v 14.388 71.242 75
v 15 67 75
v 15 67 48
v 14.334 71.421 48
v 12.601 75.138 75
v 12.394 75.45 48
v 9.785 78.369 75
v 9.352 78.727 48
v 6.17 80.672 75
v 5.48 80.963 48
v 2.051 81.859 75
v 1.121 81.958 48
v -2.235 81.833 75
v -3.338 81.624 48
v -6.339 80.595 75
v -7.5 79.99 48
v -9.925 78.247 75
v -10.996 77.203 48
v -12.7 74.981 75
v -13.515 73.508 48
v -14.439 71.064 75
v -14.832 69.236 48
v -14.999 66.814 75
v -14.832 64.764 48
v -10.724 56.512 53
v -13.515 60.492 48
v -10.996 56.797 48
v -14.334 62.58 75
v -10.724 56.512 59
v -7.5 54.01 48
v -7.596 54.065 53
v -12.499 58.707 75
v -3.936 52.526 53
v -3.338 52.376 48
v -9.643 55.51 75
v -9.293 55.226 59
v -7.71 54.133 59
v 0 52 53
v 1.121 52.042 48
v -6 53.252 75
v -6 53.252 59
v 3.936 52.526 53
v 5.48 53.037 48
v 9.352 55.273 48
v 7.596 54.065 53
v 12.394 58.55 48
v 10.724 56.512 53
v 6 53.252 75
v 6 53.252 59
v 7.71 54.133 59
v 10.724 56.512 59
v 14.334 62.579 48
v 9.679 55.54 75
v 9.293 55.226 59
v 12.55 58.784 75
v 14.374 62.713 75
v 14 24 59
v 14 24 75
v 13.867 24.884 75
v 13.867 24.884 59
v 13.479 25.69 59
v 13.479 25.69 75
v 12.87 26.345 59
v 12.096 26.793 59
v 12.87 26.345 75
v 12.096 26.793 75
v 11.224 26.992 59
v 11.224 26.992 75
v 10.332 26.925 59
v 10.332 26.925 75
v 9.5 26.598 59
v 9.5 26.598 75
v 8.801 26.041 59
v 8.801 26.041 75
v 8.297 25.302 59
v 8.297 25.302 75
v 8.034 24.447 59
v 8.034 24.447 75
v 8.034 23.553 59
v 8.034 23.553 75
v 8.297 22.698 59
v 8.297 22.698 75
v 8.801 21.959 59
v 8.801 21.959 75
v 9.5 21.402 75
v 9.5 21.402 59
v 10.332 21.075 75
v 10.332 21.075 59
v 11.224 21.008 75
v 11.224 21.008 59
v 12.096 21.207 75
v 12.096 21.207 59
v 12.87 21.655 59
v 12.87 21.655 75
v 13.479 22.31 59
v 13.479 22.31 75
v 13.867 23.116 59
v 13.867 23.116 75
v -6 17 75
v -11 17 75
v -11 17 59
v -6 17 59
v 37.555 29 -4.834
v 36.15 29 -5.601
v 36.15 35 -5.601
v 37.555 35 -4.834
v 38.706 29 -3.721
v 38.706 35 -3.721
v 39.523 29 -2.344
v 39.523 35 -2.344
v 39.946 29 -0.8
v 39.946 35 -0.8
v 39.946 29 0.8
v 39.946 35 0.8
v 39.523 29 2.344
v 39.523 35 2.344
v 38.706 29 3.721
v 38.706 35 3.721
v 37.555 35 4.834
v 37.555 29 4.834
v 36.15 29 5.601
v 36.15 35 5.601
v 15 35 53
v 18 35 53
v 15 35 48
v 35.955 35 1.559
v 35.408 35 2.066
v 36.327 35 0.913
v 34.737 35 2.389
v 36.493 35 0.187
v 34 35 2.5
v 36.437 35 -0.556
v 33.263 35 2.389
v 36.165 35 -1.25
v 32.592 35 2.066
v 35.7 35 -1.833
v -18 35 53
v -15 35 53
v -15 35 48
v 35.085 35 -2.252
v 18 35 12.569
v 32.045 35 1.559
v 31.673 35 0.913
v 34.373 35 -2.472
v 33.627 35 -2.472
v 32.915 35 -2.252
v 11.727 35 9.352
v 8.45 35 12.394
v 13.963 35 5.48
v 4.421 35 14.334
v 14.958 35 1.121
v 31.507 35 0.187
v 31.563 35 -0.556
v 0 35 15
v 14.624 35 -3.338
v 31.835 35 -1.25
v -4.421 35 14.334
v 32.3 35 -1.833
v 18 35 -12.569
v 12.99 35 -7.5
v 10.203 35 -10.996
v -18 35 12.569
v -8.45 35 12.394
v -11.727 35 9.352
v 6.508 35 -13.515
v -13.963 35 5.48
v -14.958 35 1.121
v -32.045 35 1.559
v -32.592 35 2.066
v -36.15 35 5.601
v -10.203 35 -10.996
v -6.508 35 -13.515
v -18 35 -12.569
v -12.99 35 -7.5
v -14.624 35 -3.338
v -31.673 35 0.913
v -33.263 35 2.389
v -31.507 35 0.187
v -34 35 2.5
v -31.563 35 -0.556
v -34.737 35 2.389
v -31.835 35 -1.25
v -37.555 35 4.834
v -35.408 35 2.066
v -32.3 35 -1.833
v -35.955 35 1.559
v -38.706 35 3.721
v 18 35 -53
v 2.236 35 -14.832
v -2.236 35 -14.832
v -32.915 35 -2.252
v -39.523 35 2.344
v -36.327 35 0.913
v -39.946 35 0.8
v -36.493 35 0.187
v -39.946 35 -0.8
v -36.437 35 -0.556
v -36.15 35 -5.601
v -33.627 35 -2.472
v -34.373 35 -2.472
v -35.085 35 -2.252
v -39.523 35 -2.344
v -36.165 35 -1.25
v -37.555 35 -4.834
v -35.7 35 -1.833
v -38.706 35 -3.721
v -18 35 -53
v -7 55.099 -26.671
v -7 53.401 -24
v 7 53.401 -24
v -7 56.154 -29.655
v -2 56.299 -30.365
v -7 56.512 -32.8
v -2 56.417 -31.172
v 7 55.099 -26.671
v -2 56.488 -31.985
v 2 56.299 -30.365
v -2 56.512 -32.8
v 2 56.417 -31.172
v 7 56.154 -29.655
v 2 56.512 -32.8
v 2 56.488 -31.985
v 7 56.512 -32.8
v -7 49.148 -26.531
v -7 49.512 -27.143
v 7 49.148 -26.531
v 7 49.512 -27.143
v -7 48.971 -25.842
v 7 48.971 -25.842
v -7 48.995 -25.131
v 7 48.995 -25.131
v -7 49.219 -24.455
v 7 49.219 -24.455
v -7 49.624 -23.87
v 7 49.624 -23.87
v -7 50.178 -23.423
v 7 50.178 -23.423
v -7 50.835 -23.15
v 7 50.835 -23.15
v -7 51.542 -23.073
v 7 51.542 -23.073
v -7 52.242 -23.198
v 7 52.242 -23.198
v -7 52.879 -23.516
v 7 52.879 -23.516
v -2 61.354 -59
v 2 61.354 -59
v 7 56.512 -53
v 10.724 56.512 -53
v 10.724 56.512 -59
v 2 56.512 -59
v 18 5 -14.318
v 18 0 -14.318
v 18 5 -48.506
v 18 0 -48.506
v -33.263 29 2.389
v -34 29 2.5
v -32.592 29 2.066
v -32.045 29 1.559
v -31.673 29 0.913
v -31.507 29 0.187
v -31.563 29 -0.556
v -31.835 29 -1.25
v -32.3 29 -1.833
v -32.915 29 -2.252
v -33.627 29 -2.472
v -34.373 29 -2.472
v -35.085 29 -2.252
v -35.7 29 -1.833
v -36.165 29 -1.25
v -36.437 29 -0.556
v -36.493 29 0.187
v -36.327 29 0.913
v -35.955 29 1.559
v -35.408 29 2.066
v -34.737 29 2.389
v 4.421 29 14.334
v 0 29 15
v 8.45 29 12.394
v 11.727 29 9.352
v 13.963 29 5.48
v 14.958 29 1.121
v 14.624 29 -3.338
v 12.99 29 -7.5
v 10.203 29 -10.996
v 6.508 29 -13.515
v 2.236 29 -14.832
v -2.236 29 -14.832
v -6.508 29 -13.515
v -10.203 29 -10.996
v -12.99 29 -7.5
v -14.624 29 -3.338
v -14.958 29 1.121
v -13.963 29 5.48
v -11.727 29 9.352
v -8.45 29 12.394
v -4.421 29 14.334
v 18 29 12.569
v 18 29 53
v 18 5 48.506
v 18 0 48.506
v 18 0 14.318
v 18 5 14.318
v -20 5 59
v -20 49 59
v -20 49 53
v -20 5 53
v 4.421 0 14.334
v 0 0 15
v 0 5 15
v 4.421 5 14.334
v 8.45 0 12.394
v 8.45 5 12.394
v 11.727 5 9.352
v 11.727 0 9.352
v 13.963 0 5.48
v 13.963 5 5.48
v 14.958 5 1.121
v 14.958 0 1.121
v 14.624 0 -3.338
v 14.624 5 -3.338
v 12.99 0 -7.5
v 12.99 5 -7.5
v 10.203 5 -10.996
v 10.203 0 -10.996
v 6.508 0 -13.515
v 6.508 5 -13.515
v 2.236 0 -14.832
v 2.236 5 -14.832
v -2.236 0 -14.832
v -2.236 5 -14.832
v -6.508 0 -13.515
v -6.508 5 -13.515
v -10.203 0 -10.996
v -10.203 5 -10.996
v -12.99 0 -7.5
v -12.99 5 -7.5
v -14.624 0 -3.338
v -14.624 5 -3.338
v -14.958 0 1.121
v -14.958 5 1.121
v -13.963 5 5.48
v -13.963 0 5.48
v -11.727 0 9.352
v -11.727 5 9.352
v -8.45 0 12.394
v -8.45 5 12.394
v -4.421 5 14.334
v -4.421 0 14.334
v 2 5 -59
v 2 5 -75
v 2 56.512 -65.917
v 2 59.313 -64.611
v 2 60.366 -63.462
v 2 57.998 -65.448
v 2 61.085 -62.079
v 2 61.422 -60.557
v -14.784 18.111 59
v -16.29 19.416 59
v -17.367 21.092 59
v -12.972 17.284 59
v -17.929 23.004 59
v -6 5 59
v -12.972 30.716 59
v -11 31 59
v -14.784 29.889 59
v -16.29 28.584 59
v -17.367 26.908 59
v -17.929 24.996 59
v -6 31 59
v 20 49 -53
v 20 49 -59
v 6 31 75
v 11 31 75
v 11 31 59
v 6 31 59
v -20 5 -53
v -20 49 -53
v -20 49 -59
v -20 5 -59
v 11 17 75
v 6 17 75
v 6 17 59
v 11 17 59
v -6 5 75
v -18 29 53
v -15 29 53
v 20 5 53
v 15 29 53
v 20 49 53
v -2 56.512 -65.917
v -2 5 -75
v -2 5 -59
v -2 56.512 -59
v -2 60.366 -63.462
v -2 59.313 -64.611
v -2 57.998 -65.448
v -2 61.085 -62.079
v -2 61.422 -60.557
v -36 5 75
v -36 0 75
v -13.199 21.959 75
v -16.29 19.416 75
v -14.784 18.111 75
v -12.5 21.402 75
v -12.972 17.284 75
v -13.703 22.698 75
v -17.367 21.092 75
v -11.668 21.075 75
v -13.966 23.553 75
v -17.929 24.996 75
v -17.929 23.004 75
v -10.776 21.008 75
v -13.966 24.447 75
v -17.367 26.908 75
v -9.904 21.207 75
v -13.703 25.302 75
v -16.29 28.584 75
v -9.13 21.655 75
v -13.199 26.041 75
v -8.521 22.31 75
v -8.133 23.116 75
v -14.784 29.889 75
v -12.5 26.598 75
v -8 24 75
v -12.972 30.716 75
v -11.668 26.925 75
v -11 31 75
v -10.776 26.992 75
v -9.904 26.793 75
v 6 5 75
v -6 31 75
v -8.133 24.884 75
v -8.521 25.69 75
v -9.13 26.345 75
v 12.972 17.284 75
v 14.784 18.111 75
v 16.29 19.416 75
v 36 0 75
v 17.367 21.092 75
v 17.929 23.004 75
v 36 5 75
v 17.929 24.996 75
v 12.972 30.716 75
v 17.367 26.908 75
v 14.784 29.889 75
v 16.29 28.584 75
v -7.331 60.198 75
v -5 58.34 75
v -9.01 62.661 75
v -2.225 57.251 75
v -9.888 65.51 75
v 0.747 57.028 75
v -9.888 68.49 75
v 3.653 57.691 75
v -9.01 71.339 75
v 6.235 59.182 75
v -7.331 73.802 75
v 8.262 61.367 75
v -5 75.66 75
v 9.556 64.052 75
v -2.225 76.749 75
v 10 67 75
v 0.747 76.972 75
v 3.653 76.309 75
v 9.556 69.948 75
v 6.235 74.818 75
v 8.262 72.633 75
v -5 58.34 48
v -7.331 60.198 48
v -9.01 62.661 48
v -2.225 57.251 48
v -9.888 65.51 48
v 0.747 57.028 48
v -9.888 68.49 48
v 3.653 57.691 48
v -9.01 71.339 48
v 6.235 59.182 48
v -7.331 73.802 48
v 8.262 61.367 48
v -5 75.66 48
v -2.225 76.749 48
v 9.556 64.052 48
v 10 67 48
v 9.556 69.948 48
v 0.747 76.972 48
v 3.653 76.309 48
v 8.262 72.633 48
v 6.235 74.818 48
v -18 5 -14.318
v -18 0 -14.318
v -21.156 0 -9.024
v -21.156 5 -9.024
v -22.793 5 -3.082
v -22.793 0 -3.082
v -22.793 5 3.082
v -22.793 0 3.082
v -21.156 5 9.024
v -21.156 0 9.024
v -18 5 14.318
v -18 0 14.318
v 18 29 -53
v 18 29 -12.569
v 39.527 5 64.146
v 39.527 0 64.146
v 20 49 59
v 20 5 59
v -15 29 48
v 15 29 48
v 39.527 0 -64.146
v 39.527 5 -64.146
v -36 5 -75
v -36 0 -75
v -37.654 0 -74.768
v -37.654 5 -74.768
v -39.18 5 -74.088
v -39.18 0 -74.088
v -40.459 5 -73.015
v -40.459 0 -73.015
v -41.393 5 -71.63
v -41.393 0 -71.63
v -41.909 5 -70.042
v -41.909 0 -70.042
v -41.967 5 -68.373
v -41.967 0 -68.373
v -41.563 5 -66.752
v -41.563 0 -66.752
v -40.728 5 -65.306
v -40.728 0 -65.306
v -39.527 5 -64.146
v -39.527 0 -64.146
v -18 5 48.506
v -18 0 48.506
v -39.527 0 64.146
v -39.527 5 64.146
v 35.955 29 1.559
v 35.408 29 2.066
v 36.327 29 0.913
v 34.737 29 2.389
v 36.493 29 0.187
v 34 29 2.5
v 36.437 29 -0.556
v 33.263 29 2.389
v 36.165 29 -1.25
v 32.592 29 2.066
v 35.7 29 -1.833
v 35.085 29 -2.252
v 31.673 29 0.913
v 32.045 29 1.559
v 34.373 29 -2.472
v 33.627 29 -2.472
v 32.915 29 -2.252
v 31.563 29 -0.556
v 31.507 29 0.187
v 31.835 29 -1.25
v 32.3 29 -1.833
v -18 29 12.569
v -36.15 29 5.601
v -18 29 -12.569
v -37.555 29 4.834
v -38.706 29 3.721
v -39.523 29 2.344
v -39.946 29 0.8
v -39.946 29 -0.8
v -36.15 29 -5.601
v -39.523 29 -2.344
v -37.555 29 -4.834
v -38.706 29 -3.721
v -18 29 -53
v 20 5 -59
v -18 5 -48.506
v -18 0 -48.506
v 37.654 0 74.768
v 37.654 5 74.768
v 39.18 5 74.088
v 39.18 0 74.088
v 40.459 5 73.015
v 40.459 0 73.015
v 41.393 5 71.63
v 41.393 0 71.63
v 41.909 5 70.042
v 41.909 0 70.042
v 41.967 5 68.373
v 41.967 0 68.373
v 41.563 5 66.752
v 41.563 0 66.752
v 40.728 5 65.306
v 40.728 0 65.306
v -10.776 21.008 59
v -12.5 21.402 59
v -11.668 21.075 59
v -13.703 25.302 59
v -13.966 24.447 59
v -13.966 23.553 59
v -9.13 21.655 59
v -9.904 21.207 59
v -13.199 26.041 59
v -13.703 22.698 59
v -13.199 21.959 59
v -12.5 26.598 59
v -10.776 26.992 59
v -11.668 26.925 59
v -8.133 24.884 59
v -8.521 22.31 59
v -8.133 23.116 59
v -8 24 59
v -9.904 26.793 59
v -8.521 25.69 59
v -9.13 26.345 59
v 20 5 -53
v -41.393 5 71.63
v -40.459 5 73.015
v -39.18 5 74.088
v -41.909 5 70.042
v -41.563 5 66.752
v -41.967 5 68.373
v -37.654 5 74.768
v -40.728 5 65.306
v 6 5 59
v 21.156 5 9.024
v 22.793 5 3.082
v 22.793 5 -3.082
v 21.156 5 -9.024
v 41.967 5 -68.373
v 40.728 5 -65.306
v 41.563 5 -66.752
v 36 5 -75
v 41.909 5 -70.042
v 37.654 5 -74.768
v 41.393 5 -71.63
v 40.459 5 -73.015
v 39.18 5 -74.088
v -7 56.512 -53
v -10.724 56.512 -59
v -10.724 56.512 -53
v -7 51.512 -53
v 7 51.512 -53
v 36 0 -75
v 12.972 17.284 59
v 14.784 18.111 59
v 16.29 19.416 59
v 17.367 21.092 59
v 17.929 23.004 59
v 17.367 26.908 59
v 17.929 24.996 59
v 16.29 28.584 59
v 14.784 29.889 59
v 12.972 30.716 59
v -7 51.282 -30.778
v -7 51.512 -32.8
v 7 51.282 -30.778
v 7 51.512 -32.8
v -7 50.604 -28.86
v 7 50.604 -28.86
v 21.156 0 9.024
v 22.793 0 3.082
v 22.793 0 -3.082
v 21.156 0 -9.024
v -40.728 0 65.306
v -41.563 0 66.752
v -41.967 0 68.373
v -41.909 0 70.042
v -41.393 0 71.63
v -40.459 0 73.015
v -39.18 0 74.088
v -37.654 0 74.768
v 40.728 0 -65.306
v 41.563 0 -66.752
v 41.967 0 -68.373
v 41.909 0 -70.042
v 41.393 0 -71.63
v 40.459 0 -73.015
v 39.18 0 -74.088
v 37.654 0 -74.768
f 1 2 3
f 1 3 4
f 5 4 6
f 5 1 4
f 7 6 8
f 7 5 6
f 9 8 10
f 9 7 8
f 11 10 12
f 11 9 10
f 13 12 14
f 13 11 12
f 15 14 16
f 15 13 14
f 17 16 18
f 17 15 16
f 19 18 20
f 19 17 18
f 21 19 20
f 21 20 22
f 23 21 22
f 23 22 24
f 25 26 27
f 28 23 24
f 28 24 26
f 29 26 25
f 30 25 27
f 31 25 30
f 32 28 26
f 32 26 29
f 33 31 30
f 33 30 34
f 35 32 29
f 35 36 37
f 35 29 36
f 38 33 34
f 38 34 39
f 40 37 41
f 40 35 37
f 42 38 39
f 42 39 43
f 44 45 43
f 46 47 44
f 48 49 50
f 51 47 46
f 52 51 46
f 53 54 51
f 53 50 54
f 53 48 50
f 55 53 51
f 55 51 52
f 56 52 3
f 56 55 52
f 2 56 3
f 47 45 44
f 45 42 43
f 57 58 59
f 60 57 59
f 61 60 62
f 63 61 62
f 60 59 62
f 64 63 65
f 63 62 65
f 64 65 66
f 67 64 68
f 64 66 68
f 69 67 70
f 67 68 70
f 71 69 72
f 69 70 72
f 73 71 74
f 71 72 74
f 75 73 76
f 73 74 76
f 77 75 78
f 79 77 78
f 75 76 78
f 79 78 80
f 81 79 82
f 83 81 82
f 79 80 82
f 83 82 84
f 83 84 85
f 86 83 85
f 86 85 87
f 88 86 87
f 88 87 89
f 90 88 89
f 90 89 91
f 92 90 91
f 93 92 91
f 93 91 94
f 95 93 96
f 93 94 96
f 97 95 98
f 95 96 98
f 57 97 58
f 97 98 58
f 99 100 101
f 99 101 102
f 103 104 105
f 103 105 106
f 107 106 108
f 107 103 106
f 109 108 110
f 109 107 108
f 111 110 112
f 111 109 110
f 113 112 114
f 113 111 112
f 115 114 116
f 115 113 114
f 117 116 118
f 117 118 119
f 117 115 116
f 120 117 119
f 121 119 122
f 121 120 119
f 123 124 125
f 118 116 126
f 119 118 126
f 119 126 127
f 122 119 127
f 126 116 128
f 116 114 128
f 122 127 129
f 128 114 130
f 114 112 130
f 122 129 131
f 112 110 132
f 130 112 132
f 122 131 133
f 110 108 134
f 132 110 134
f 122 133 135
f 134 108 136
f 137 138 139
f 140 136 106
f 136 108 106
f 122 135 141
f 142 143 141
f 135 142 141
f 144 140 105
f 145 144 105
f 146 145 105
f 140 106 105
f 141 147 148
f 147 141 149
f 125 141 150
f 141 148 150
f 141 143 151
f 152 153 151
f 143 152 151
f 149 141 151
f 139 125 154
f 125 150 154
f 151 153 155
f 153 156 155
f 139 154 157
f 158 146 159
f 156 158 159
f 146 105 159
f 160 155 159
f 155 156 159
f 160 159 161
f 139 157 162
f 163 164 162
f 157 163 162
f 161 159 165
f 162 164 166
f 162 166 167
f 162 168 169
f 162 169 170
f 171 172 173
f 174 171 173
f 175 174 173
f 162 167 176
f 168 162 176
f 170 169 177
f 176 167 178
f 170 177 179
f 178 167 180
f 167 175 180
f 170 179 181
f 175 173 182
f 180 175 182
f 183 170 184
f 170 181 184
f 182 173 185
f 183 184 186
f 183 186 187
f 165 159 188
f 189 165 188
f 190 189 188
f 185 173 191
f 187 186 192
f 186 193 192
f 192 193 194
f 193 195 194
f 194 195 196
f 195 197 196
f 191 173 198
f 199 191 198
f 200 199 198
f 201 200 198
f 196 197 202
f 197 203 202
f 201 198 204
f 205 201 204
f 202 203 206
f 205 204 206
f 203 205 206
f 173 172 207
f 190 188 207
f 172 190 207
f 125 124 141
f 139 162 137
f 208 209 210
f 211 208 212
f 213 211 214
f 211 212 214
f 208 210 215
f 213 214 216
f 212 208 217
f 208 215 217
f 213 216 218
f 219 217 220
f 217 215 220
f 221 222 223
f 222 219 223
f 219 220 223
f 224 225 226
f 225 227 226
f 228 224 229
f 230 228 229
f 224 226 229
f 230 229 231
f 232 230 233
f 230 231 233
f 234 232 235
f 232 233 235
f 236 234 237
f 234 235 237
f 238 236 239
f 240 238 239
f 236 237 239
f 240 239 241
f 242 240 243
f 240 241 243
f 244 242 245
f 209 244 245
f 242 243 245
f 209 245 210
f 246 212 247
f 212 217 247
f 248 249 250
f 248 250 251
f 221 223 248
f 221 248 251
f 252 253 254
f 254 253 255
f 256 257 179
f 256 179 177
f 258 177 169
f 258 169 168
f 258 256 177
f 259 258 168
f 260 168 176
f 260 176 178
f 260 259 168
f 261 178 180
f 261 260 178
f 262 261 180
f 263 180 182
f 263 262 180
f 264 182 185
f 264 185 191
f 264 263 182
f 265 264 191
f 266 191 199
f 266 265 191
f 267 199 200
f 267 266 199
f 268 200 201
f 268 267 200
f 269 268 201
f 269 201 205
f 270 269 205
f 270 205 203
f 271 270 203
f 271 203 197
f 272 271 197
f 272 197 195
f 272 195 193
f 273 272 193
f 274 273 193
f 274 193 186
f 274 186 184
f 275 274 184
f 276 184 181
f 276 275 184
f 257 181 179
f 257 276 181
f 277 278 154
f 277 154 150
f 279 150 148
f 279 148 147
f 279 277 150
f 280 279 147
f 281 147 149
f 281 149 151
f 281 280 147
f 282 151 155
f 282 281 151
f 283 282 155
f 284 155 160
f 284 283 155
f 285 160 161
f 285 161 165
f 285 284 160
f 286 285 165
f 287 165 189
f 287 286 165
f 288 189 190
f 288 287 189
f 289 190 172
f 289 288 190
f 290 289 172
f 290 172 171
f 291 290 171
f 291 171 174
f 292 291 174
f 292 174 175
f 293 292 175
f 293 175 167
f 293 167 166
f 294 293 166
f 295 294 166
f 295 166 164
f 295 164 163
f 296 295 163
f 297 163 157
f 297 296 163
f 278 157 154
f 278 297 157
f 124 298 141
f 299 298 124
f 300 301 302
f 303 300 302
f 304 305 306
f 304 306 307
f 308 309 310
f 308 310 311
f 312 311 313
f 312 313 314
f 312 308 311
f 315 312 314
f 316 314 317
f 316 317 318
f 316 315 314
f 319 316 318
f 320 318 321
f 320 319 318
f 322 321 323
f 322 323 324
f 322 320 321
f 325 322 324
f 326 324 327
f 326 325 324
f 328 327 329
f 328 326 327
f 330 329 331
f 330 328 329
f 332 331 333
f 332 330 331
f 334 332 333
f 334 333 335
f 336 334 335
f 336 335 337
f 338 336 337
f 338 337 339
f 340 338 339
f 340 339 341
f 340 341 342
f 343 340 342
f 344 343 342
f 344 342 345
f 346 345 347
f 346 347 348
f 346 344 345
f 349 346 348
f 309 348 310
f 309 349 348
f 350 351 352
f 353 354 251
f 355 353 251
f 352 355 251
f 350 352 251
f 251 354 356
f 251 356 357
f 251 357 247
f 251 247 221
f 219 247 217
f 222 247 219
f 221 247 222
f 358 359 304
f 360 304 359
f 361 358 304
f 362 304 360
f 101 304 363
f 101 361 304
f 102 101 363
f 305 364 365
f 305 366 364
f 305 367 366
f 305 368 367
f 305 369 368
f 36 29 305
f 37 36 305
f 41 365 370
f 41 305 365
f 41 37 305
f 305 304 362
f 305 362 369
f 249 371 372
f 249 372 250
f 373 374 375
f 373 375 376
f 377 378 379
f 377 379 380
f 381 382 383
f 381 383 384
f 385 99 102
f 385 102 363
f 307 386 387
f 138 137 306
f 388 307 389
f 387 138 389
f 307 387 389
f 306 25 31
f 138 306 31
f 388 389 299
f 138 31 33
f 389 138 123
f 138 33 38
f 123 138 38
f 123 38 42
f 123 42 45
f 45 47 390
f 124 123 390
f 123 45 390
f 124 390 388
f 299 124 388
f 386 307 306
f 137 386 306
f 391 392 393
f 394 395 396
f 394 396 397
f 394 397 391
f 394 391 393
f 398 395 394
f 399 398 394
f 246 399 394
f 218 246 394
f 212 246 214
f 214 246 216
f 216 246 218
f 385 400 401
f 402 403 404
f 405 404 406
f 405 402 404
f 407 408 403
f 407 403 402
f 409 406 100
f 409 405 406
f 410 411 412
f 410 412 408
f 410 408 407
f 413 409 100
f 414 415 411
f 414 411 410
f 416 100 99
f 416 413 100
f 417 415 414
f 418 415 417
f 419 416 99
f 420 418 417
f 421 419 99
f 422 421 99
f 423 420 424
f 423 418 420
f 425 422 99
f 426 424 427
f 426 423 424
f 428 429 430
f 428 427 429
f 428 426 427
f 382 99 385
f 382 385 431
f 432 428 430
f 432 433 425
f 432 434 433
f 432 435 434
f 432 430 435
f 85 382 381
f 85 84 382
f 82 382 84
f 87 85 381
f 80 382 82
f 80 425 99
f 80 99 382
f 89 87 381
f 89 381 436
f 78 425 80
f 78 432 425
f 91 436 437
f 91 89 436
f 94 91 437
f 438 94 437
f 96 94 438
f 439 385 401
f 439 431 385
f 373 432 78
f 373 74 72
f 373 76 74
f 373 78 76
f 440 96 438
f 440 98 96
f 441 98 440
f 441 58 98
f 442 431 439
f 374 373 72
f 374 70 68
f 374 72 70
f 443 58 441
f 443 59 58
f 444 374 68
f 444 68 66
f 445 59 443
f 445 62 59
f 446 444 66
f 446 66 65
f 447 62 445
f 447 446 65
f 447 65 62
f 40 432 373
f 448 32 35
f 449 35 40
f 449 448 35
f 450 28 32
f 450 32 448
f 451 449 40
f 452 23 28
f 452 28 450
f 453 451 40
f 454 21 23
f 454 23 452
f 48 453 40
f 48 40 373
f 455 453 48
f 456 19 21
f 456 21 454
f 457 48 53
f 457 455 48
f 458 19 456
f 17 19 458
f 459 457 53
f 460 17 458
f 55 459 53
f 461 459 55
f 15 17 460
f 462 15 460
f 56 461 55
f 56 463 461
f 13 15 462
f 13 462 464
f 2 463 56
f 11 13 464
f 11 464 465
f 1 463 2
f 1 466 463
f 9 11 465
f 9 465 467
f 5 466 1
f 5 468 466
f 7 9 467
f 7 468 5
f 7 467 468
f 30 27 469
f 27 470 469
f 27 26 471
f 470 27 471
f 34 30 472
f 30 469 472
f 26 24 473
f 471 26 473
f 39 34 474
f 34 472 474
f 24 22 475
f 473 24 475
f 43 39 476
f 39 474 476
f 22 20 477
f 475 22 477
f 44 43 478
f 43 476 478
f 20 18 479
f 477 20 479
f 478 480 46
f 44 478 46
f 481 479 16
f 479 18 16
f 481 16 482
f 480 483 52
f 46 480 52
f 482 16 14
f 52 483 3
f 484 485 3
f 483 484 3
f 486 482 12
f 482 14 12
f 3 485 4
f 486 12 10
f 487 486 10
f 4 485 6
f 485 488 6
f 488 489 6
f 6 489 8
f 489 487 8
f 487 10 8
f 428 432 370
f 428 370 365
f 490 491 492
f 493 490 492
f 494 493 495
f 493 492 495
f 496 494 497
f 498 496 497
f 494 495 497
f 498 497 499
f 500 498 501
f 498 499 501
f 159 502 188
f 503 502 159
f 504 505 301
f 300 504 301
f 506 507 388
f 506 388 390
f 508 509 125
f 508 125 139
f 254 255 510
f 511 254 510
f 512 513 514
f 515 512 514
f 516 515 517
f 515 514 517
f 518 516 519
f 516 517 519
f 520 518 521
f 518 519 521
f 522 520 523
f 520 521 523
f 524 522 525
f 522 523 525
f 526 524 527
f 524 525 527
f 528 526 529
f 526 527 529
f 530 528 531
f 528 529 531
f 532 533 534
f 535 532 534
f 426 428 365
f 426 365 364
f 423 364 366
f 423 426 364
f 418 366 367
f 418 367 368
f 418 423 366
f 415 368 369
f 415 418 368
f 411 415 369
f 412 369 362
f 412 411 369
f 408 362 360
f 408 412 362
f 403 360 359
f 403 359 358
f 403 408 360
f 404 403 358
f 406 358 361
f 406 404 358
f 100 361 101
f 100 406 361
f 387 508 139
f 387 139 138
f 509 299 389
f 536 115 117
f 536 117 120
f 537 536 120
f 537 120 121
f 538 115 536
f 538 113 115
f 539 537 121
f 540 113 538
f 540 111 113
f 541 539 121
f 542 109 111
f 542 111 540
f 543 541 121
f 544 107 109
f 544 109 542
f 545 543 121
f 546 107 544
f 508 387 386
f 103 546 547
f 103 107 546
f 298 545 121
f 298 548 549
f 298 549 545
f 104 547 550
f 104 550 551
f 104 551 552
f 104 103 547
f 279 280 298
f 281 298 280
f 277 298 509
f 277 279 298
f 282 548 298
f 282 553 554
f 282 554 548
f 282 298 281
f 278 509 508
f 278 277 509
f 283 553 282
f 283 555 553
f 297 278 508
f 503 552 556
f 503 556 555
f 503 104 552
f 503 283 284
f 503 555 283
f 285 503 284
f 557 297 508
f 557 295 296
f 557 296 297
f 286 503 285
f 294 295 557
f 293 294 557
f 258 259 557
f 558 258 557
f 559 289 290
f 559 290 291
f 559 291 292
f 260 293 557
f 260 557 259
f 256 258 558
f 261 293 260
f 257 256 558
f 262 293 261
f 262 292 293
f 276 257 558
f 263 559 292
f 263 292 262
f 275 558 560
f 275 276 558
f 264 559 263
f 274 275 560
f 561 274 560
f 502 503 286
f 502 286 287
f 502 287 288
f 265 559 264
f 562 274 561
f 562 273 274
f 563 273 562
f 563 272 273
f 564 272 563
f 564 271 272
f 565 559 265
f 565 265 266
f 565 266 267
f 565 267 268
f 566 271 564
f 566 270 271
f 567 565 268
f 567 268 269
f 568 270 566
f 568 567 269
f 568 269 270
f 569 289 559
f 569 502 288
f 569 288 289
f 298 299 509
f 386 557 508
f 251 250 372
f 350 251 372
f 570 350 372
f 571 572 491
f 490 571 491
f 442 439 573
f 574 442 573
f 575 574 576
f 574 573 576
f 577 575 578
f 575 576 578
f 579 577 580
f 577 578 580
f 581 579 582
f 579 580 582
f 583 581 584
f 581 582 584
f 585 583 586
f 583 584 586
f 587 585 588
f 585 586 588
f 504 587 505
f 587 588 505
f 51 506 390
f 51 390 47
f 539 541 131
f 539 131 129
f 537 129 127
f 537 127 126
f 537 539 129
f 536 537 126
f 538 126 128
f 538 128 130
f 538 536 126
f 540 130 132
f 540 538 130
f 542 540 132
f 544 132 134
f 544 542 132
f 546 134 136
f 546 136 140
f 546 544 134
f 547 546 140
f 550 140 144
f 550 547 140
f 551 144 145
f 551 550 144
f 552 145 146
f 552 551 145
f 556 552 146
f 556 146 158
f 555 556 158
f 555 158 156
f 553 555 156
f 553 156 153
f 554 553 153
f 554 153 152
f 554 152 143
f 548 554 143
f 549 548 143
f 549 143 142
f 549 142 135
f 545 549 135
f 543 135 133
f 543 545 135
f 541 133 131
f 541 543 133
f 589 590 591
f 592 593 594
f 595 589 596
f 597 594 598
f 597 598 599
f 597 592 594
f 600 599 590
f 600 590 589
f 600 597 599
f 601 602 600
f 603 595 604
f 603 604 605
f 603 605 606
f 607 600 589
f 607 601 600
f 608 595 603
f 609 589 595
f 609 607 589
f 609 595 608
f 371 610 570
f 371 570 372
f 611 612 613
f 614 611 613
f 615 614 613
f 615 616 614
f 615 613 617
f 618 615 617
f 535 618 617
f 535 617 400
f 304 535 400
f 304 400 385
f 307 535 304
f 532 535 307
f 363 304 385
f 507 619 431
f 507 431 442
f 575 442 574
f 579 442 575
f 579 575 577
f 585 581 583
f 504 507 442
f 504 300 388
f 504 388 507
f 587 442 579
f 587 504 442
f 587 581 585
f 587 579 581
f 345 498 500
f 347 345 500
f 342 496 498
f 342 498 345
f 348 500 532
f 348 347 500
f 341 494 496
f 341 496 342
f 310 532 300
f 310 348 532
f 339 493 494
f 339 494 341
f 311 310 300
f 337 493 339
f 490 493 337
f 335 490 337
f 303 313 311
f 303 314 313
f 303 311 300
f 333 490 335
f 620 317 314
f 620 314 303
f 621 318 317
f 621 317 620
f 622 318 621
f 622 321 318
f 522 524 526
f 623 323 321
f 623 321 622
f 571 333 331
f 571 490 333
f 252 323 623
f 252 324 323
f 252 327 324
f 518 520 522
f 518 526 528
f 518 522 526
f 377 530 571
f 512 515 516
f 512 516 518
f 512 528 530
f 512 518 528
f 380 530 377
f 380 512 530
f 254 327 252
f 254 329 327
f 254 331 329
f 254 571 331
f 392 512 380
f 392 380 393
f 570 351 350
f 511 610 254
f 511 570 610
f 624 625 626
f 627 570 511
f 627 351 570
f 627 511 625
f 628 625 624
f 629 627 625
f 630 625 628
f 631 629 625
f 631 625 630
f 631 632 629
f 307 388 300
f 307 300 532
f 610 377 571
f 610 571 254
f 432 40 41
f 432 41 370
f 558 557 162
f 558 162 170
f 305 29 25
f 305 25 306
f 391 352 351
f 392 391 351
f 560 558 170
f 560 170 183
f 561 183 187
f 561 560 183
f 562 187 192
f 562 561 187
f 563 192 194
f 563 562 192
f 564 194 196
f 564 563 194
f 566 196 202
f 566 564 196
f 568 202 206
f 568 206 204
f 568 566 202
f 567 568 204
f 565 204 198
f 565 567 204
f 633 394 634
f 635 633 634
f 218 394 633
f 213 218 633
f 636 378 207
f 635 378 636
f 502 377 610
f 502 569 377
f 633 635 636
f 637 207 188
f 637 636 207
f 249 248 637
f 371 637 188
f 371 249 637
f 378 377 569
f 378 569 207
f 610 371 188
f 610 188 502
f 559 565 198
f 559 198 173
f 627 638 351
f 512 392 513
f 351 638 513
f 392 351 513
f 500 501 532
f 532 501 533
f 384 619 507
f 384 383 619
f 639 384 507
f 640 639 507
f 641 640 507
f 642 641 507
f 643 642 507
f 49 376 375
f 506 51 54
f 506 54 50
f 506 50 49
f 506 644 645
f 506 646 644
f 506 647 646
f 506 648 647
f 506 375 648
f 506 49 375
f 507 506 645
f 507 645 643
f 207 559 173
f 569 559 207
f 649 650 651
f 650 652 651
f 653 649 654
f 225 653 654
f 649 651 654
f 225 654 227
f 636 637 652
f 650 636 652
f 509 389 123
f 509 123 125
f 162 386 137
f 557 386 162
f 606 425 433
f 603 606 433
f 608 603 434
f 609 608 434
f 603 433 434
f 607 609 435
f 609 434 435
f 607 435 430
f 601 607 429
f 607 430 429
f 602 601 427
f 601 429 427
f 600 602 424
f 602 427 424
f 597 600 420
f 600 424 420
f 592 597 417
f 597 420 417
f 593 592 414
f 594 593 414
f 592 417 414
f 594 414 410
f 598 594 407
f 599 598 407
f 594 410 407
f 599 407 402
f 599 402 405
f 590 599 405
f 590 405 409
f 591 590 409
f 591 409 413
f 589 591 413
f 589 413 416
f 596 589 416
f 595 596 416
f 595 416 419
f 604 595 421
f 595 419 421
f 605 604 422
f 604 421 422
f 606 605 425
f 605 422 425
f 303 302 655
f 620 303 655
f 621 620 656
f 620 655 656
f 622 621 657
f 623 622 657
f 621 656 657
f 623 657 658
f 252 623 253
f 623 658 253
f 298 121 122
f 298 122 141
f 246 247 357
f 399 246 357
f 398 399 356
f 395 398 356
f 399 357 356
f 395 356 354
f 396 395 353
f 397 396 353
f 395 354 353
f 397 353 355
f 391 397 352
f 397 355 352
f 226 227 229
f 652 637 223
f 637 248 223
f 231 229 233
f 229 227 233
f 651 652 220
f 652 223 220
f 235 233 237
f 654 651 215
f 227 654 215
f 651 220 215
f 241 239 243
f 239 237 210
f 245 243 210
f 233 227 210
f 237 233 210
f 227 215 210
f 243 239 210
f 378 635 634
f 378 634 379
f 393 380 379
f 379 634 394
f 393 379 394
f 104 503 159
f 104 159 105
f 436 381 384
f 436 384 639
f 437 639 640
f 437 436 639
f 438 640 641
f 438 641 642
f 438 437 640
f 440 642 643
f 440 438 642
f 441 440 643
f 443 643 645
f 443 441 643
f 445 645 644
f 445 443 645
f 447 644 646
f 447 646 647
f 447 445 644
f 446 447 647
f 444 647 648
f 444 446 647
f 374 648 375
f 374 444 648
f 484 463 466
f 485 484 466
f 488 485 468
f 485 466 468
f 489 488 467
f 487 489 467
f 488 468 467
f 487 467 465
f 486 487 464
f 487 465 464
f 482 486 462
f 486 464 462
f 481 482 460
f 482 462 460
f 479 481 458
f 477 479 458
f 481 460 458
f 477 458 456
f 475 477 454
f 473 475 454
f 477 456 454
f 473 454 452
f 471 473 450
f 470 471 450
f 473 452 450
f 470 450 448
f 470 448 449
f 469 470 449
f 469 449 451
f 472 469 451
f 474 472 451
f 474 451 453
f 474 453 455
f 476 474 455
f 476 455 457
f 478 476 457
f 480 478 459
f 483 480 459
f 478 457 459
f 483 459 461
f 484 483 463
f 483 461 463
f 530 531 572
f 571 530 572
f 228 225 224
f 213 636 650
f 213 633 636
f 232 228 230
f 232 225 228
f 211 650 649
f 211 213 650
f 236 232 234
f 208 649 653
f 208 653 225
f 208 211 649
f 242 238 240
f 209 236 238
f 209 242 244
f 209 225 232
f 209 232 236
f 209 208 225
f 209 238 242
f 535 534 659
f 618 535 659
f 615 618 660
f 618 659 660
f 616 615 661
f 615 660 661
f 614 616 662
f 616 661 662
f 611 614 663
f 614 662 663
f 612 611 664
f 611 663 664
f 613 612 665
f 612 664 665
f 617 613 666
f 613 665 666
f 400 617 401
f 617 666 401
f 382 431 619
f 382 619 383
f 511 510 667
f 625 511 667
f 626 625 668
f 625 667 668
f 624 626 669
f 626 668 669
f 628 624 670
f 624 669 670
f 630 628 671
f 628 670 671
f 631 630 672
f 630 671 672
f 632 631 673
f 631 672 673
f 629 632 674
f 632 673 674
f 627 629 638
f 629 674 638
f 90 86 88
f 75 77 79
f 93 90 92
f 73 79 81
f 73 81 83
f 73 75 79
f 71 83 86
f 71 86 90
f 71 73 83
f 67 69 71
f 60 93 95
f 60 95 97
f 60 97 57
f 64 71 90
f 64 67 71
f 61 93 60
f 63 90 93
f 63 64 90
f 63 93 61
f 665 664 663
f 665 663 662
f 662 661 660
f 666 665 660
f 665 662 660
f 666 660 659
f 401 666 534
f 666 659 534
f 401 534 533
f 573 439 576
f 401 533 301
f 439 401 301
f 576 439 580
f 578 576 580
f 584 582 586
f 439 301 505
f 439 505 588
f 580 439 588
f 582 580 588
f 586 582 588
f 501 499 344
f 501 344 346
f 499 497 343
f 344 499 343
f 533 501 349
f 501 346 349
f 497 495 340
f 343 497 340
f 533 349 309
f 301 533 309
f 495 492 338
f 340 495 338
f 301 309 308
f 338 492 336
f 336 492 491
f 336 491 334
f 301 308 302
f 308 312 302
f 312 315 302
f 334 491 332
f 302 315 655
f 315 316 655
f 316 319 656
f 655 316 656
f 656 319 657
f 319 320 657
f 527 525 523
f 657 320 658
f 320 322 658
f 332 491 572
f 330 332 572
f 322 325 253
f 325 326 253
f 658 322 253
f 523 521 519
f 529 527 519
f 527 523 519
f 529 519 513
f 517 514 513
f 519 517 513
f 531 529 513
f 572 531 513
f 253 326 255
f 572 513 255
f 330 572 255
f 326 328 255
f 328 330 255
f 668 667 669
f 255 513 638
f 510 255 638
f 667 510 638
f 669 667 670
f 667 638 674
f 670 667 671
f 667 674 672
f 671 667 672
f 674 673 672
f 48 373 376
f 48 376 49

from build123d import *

# Parameters (mm, degrees)
SKETCH1_R            = 15
BOSS_EXTRUDE1_DEPTH  = 5
SKETCH2_R            = 15
SKETCH2_R_2          = 10
BOSS_EXTRUDE2_DEPTH  = 27
SKETCH4_R            = 3
BOSS_EXTRUDE19_DEPTH = 16
BOSS_EXTRUDE20_DEPTH = 6
LPATTERN1_COUNT      = 2
LPATTERN1_PITCH      = 112
BOSS_EXTRUDE21_START = -6
BOSS_EXTRUDE21_DEPTH = 6
BOSS_EXTRUDE22_START = 24
SKETCH8_R            = 2.5
SKETCH8_R_2          = 15
BOSS_EXTRUDE22_DEPTH = 6
BOSS_EXTRUDE23_DEPTH = 7
BOSS_EXTRUDE24_DEPTH = 2


with BuildPart() as part:
    # Sketch1 → Boss-Extrude1 (new body)
    with BuildSketch(Plane(origin=(0, 0, 0), x_dir=(1, 0, 0), z_dir=(0, 1, 0))):
        with BuildLine():
            Line((-18, 48.505826631), (-18, 14.317821063))
            ThreePointArc((-18, 14.317821063), (-23, 0), (-18, -14.317821063))
            Line((-18, -14.317821063), (-18, -48.505826631))
            Line((-18, -48.505826631), (-39.526711514, -64.145898034))
            ThreePointArc((-39.526711514, -64.145898034), (-41.706339098, -70.854101966), (-36, -75))
            Line((-36, -75), (36, -75))
            ThreePointArc((36, -75), (41.706339098, -70.854101966), (39.526711514, -64.145898034))
            Line((39.526711514, -64.145898034), (18, -48.505826631))
            Line((18, -48.505826631), (18, -14.317821063))
            ThreePointArc((18, -14.317821063), (23, 0), (18, 14.317821063))
            Line((18, 14.317821063), (18, 48.505826631))
            Line((18, 48.505826631), (39.526711514, 64.145898034))
            ThreePointArc((39.526711514, 64.145898034), (41.706339098, 70.854101966), (36, 75))
            Line((36, 75), (-36, 75))
            ThreePointArc((-36, 75), (-41.706339098, 70.854101966), (-39.526711514, 64.145898034))
            Line((-39.526711514, 64.145898034), (-18, 48.505826631))
        make_face()
        with Locations(Location((0, 0, 0), (0, 0, 270))):
            Circle(SKETCH1_R, mode=Mode.SUBTRACT)
    extrude(amount=BOSS_EXTRUDE1_DEPTH)



with BuildPart() as body_2:
    # Sketch2 → Boss-Extrude2 (new body)
    with BuildSketch(Plane.XY.offset(75)):
        with Locations((0, 67)):
            Circle(SKETCH2_R)
        with Locations((0, 67)):
            Circle(SKETCH2_R_2, mode=Mode.SUBTRACT)
    extrude(amount=-BOSS_EXTRUDE2_DEPTH)


with BuildPart() as part_1:
    add(part.part)

    add(body_2.part)  # Boss-Extrude19 merges body 2
    # Sketch4 → Boss-Extrude19 (add)
    with BuildSketch(Plane.XY.offset(75)):
        with BuildLine():
            Line((-6, 53.252272915), (-6, 31))
            Line((-6, 31), (-11, 31))
            ThreePointArc((-11, 31), (-18, 24), (-11, 17))
            Line((-11, 17), (-6, 17))
            Line((-6, 17), (-6, 5))
            Line((-6, 5), (6, 5))
            Line((6, 5), (6, 17))
            Line((6, 17), (11, 17))
            ThreePointArc((11, 17), (18, 24), (11, 31))
            Line((11, 31), (6, 31))
            Line((6, 31), (6, 53.252272915))
            ThreePointArc((6, 53.252272915), (0, 52), (-6, 53.252272915))
        make_face()
        with Locations((-11, 24)):
            Circle(SKETCH4_R, mode=Mode.SUBTRACT)
        with Locations((11, 24)):
            Circle(SKETCH4_R, mode=Mode.SUBTRACT)
    extrude(amount=-BOSS_EXTRUDE19_DEPTH)

    # Sketch5 → Boss-Extrude20 (add)
    with BuildSketch(Plane(origin=(0, 0, 59), x_dir=(-1, 0, 0), z_dir=(0, 0, -1))):
        with BuildLine():
            Line((-20, 5), (-20, 49))
            Line((-20, 49), (-10.723697691, 56.511801497))
            ThreePointArc((-10.723697691, 56.511801497), (0, 52), (10.723697691, 56.511801497))
            Line((10.723697691, 56.511801497), (20, 49))
            Line((20, 49), (20, 5))
            Line((20, 5), (-20, 5))
        make_face()
    boss_extrude20 = extrude(amount=BOSS_EXTRUDE20_DEPTH)

    # LPattern1: Boss-Extrude20 ×2
    with Locations(*[(0, 0, -i * LPATTERN1_PITCH) for i in range(1, LPATTERN1_COUNT)]):
        add(boss_extrude20)

    # Sketch7 → Boss-Extrude21 (add)
    with BuildSketch(Plane(origin=(0, 0, -59), x_dir=(-1, 0, 0), z_dir=(0, 0, -1)).offset(BOSS_EXTRUDE21_START)):
        with BuildLine():
            Line((-10.723697691, 56.511801497), (10.723697691, 56.511801497))
            ThreePointArc((10.723697691, 56.511801497), (0, 52), (-10.723697691, 56.511801497))
        make_face()
    extrude(amount=BOSS_EXTRUDE21_DEPTH)

    # Sketch8 → Boss-Extrude22 (add)
    with BuildSketch(Plane(origin=(0, 5, 0), x_dir=(1, 0, 0), z_dir=(0, 1, 0)).offset(BOSS_EXTRUDE22_START)):
        with BuildLine():
            Line((-36.150207697, 5.601482559), (-18, 12.568694522))
            Line((-18, 12.568694522), (-18, 53))
            Line((-18, 53), (18, 53))
            Line((18, 53), (18, 12.568694522))
            Line((18, 12.568694522), (36.150207697, 5.601482559))
            ThreePointArc((36.150207697, 5.601482559), (40, 0), (36.150207697, -5.601482559))
            Line((36.150207697, -5.601482559), (18, -12.568694522))
            Line((18, -12.568694522), (18, -53))
            Line((18, -53), (15, -53))
            Line((15, -53), (15, -48))
            Line((15, -48), (-15, -48))
            Line((-15, -48), (-15, -53))
            Line((-15, -53), (-18, -53))
            Line((-18, -53), (-18, -12.568694522))
            Line((-18, -12.568694522), (-36.150207697, -5.601482559))
            ThreePointArc((-36.150207697, -5.601482559), (-40, 0), (-36.150207697, 5.601482559))
        make_face()
        with Locations(Location((-34, 0, 0), (0, 0, 270))):
            Circle(SKETCH8_R, mode=Mode.SUBTRACT)
        with Locations(Location((34, 0, 0), (0, 0, 270))):
            Circle(SKETCH8_R, mode=Mode.SUBTRACT)
        with Locations(Location((0, 0, 0), (0, 0, 270))):
            Circle(SKETCH8_R_2, mode=Mode.SUBTRACT)
    extrude(amount=BOSS_EXTRUDE22_DEPTH)

    # Sketch9 → Boss-Extrude23 (add, symmetric)
    with BuildSketch(Plane(origin=(0, 0, 0), x_dir=(0, 0, -1), z_dir=(1, 0, 0))):
        with BuildLine():
            Line((53, 51.511801497), (32.799551055, 51.511801497))
            ThreePointArc((32.799551055, 51.511801497), (29.799551055, 50.997082871), (27.142696805, 49.511801497))
            ThreePointArc((27.142696805, 49.511801497), (23.626903958, 49.884897539), (24, 53.400690386))
            ThreePointArc((24, 53.400690386), (28.132884388, 55.711128079), (32.799551055, 56.511801497))
            Line((32.799551055, 56.511801497), (53, 56.511801497))
            Line((53, 56.511801497), (53, 51.511801497))
        make_face()
    extrude(amount=BOSS_EXTRUDE23_DEPTH, both=True)

    # Sketch10 → Boss-Extrude24 (add, symmetric)
    with BuildSketch(Plane(origin=(0, 0, 0), x_dir=(0, 0, -1), z_dir=(1, 0, 0))):
        with BuildLine():
            Line((75, 5), (64.145898034, 5))
            Line((64.145898034, 5), (59, 5))
            Line((59, 5), (59, 49))
            Line((59, 49), (59, 56.511801497))
            Line((59, 56.511801497), (53, 56.511801497))
            Line((53, 56.511801497), (32.799551055, 56.511801497))
            ThreePointArc((32.799551055, 56.511801497), (31.5778479, 56.458393963), (30.365465911, 56.29857884))
            Line((30.365465911, 56.29857884), (59, 61.35406732))
            ThreePointArc((59, 61.35406732), (63.46156073, 60.365729702), (65.917079571, 56.511801497))
            Line((65.917079571, 56.511801497), (75, 5))
        make_face()
    extrude(amount=BOSS_EXTRUDE24_DEPTH, both=True)


solid = part_1.part
